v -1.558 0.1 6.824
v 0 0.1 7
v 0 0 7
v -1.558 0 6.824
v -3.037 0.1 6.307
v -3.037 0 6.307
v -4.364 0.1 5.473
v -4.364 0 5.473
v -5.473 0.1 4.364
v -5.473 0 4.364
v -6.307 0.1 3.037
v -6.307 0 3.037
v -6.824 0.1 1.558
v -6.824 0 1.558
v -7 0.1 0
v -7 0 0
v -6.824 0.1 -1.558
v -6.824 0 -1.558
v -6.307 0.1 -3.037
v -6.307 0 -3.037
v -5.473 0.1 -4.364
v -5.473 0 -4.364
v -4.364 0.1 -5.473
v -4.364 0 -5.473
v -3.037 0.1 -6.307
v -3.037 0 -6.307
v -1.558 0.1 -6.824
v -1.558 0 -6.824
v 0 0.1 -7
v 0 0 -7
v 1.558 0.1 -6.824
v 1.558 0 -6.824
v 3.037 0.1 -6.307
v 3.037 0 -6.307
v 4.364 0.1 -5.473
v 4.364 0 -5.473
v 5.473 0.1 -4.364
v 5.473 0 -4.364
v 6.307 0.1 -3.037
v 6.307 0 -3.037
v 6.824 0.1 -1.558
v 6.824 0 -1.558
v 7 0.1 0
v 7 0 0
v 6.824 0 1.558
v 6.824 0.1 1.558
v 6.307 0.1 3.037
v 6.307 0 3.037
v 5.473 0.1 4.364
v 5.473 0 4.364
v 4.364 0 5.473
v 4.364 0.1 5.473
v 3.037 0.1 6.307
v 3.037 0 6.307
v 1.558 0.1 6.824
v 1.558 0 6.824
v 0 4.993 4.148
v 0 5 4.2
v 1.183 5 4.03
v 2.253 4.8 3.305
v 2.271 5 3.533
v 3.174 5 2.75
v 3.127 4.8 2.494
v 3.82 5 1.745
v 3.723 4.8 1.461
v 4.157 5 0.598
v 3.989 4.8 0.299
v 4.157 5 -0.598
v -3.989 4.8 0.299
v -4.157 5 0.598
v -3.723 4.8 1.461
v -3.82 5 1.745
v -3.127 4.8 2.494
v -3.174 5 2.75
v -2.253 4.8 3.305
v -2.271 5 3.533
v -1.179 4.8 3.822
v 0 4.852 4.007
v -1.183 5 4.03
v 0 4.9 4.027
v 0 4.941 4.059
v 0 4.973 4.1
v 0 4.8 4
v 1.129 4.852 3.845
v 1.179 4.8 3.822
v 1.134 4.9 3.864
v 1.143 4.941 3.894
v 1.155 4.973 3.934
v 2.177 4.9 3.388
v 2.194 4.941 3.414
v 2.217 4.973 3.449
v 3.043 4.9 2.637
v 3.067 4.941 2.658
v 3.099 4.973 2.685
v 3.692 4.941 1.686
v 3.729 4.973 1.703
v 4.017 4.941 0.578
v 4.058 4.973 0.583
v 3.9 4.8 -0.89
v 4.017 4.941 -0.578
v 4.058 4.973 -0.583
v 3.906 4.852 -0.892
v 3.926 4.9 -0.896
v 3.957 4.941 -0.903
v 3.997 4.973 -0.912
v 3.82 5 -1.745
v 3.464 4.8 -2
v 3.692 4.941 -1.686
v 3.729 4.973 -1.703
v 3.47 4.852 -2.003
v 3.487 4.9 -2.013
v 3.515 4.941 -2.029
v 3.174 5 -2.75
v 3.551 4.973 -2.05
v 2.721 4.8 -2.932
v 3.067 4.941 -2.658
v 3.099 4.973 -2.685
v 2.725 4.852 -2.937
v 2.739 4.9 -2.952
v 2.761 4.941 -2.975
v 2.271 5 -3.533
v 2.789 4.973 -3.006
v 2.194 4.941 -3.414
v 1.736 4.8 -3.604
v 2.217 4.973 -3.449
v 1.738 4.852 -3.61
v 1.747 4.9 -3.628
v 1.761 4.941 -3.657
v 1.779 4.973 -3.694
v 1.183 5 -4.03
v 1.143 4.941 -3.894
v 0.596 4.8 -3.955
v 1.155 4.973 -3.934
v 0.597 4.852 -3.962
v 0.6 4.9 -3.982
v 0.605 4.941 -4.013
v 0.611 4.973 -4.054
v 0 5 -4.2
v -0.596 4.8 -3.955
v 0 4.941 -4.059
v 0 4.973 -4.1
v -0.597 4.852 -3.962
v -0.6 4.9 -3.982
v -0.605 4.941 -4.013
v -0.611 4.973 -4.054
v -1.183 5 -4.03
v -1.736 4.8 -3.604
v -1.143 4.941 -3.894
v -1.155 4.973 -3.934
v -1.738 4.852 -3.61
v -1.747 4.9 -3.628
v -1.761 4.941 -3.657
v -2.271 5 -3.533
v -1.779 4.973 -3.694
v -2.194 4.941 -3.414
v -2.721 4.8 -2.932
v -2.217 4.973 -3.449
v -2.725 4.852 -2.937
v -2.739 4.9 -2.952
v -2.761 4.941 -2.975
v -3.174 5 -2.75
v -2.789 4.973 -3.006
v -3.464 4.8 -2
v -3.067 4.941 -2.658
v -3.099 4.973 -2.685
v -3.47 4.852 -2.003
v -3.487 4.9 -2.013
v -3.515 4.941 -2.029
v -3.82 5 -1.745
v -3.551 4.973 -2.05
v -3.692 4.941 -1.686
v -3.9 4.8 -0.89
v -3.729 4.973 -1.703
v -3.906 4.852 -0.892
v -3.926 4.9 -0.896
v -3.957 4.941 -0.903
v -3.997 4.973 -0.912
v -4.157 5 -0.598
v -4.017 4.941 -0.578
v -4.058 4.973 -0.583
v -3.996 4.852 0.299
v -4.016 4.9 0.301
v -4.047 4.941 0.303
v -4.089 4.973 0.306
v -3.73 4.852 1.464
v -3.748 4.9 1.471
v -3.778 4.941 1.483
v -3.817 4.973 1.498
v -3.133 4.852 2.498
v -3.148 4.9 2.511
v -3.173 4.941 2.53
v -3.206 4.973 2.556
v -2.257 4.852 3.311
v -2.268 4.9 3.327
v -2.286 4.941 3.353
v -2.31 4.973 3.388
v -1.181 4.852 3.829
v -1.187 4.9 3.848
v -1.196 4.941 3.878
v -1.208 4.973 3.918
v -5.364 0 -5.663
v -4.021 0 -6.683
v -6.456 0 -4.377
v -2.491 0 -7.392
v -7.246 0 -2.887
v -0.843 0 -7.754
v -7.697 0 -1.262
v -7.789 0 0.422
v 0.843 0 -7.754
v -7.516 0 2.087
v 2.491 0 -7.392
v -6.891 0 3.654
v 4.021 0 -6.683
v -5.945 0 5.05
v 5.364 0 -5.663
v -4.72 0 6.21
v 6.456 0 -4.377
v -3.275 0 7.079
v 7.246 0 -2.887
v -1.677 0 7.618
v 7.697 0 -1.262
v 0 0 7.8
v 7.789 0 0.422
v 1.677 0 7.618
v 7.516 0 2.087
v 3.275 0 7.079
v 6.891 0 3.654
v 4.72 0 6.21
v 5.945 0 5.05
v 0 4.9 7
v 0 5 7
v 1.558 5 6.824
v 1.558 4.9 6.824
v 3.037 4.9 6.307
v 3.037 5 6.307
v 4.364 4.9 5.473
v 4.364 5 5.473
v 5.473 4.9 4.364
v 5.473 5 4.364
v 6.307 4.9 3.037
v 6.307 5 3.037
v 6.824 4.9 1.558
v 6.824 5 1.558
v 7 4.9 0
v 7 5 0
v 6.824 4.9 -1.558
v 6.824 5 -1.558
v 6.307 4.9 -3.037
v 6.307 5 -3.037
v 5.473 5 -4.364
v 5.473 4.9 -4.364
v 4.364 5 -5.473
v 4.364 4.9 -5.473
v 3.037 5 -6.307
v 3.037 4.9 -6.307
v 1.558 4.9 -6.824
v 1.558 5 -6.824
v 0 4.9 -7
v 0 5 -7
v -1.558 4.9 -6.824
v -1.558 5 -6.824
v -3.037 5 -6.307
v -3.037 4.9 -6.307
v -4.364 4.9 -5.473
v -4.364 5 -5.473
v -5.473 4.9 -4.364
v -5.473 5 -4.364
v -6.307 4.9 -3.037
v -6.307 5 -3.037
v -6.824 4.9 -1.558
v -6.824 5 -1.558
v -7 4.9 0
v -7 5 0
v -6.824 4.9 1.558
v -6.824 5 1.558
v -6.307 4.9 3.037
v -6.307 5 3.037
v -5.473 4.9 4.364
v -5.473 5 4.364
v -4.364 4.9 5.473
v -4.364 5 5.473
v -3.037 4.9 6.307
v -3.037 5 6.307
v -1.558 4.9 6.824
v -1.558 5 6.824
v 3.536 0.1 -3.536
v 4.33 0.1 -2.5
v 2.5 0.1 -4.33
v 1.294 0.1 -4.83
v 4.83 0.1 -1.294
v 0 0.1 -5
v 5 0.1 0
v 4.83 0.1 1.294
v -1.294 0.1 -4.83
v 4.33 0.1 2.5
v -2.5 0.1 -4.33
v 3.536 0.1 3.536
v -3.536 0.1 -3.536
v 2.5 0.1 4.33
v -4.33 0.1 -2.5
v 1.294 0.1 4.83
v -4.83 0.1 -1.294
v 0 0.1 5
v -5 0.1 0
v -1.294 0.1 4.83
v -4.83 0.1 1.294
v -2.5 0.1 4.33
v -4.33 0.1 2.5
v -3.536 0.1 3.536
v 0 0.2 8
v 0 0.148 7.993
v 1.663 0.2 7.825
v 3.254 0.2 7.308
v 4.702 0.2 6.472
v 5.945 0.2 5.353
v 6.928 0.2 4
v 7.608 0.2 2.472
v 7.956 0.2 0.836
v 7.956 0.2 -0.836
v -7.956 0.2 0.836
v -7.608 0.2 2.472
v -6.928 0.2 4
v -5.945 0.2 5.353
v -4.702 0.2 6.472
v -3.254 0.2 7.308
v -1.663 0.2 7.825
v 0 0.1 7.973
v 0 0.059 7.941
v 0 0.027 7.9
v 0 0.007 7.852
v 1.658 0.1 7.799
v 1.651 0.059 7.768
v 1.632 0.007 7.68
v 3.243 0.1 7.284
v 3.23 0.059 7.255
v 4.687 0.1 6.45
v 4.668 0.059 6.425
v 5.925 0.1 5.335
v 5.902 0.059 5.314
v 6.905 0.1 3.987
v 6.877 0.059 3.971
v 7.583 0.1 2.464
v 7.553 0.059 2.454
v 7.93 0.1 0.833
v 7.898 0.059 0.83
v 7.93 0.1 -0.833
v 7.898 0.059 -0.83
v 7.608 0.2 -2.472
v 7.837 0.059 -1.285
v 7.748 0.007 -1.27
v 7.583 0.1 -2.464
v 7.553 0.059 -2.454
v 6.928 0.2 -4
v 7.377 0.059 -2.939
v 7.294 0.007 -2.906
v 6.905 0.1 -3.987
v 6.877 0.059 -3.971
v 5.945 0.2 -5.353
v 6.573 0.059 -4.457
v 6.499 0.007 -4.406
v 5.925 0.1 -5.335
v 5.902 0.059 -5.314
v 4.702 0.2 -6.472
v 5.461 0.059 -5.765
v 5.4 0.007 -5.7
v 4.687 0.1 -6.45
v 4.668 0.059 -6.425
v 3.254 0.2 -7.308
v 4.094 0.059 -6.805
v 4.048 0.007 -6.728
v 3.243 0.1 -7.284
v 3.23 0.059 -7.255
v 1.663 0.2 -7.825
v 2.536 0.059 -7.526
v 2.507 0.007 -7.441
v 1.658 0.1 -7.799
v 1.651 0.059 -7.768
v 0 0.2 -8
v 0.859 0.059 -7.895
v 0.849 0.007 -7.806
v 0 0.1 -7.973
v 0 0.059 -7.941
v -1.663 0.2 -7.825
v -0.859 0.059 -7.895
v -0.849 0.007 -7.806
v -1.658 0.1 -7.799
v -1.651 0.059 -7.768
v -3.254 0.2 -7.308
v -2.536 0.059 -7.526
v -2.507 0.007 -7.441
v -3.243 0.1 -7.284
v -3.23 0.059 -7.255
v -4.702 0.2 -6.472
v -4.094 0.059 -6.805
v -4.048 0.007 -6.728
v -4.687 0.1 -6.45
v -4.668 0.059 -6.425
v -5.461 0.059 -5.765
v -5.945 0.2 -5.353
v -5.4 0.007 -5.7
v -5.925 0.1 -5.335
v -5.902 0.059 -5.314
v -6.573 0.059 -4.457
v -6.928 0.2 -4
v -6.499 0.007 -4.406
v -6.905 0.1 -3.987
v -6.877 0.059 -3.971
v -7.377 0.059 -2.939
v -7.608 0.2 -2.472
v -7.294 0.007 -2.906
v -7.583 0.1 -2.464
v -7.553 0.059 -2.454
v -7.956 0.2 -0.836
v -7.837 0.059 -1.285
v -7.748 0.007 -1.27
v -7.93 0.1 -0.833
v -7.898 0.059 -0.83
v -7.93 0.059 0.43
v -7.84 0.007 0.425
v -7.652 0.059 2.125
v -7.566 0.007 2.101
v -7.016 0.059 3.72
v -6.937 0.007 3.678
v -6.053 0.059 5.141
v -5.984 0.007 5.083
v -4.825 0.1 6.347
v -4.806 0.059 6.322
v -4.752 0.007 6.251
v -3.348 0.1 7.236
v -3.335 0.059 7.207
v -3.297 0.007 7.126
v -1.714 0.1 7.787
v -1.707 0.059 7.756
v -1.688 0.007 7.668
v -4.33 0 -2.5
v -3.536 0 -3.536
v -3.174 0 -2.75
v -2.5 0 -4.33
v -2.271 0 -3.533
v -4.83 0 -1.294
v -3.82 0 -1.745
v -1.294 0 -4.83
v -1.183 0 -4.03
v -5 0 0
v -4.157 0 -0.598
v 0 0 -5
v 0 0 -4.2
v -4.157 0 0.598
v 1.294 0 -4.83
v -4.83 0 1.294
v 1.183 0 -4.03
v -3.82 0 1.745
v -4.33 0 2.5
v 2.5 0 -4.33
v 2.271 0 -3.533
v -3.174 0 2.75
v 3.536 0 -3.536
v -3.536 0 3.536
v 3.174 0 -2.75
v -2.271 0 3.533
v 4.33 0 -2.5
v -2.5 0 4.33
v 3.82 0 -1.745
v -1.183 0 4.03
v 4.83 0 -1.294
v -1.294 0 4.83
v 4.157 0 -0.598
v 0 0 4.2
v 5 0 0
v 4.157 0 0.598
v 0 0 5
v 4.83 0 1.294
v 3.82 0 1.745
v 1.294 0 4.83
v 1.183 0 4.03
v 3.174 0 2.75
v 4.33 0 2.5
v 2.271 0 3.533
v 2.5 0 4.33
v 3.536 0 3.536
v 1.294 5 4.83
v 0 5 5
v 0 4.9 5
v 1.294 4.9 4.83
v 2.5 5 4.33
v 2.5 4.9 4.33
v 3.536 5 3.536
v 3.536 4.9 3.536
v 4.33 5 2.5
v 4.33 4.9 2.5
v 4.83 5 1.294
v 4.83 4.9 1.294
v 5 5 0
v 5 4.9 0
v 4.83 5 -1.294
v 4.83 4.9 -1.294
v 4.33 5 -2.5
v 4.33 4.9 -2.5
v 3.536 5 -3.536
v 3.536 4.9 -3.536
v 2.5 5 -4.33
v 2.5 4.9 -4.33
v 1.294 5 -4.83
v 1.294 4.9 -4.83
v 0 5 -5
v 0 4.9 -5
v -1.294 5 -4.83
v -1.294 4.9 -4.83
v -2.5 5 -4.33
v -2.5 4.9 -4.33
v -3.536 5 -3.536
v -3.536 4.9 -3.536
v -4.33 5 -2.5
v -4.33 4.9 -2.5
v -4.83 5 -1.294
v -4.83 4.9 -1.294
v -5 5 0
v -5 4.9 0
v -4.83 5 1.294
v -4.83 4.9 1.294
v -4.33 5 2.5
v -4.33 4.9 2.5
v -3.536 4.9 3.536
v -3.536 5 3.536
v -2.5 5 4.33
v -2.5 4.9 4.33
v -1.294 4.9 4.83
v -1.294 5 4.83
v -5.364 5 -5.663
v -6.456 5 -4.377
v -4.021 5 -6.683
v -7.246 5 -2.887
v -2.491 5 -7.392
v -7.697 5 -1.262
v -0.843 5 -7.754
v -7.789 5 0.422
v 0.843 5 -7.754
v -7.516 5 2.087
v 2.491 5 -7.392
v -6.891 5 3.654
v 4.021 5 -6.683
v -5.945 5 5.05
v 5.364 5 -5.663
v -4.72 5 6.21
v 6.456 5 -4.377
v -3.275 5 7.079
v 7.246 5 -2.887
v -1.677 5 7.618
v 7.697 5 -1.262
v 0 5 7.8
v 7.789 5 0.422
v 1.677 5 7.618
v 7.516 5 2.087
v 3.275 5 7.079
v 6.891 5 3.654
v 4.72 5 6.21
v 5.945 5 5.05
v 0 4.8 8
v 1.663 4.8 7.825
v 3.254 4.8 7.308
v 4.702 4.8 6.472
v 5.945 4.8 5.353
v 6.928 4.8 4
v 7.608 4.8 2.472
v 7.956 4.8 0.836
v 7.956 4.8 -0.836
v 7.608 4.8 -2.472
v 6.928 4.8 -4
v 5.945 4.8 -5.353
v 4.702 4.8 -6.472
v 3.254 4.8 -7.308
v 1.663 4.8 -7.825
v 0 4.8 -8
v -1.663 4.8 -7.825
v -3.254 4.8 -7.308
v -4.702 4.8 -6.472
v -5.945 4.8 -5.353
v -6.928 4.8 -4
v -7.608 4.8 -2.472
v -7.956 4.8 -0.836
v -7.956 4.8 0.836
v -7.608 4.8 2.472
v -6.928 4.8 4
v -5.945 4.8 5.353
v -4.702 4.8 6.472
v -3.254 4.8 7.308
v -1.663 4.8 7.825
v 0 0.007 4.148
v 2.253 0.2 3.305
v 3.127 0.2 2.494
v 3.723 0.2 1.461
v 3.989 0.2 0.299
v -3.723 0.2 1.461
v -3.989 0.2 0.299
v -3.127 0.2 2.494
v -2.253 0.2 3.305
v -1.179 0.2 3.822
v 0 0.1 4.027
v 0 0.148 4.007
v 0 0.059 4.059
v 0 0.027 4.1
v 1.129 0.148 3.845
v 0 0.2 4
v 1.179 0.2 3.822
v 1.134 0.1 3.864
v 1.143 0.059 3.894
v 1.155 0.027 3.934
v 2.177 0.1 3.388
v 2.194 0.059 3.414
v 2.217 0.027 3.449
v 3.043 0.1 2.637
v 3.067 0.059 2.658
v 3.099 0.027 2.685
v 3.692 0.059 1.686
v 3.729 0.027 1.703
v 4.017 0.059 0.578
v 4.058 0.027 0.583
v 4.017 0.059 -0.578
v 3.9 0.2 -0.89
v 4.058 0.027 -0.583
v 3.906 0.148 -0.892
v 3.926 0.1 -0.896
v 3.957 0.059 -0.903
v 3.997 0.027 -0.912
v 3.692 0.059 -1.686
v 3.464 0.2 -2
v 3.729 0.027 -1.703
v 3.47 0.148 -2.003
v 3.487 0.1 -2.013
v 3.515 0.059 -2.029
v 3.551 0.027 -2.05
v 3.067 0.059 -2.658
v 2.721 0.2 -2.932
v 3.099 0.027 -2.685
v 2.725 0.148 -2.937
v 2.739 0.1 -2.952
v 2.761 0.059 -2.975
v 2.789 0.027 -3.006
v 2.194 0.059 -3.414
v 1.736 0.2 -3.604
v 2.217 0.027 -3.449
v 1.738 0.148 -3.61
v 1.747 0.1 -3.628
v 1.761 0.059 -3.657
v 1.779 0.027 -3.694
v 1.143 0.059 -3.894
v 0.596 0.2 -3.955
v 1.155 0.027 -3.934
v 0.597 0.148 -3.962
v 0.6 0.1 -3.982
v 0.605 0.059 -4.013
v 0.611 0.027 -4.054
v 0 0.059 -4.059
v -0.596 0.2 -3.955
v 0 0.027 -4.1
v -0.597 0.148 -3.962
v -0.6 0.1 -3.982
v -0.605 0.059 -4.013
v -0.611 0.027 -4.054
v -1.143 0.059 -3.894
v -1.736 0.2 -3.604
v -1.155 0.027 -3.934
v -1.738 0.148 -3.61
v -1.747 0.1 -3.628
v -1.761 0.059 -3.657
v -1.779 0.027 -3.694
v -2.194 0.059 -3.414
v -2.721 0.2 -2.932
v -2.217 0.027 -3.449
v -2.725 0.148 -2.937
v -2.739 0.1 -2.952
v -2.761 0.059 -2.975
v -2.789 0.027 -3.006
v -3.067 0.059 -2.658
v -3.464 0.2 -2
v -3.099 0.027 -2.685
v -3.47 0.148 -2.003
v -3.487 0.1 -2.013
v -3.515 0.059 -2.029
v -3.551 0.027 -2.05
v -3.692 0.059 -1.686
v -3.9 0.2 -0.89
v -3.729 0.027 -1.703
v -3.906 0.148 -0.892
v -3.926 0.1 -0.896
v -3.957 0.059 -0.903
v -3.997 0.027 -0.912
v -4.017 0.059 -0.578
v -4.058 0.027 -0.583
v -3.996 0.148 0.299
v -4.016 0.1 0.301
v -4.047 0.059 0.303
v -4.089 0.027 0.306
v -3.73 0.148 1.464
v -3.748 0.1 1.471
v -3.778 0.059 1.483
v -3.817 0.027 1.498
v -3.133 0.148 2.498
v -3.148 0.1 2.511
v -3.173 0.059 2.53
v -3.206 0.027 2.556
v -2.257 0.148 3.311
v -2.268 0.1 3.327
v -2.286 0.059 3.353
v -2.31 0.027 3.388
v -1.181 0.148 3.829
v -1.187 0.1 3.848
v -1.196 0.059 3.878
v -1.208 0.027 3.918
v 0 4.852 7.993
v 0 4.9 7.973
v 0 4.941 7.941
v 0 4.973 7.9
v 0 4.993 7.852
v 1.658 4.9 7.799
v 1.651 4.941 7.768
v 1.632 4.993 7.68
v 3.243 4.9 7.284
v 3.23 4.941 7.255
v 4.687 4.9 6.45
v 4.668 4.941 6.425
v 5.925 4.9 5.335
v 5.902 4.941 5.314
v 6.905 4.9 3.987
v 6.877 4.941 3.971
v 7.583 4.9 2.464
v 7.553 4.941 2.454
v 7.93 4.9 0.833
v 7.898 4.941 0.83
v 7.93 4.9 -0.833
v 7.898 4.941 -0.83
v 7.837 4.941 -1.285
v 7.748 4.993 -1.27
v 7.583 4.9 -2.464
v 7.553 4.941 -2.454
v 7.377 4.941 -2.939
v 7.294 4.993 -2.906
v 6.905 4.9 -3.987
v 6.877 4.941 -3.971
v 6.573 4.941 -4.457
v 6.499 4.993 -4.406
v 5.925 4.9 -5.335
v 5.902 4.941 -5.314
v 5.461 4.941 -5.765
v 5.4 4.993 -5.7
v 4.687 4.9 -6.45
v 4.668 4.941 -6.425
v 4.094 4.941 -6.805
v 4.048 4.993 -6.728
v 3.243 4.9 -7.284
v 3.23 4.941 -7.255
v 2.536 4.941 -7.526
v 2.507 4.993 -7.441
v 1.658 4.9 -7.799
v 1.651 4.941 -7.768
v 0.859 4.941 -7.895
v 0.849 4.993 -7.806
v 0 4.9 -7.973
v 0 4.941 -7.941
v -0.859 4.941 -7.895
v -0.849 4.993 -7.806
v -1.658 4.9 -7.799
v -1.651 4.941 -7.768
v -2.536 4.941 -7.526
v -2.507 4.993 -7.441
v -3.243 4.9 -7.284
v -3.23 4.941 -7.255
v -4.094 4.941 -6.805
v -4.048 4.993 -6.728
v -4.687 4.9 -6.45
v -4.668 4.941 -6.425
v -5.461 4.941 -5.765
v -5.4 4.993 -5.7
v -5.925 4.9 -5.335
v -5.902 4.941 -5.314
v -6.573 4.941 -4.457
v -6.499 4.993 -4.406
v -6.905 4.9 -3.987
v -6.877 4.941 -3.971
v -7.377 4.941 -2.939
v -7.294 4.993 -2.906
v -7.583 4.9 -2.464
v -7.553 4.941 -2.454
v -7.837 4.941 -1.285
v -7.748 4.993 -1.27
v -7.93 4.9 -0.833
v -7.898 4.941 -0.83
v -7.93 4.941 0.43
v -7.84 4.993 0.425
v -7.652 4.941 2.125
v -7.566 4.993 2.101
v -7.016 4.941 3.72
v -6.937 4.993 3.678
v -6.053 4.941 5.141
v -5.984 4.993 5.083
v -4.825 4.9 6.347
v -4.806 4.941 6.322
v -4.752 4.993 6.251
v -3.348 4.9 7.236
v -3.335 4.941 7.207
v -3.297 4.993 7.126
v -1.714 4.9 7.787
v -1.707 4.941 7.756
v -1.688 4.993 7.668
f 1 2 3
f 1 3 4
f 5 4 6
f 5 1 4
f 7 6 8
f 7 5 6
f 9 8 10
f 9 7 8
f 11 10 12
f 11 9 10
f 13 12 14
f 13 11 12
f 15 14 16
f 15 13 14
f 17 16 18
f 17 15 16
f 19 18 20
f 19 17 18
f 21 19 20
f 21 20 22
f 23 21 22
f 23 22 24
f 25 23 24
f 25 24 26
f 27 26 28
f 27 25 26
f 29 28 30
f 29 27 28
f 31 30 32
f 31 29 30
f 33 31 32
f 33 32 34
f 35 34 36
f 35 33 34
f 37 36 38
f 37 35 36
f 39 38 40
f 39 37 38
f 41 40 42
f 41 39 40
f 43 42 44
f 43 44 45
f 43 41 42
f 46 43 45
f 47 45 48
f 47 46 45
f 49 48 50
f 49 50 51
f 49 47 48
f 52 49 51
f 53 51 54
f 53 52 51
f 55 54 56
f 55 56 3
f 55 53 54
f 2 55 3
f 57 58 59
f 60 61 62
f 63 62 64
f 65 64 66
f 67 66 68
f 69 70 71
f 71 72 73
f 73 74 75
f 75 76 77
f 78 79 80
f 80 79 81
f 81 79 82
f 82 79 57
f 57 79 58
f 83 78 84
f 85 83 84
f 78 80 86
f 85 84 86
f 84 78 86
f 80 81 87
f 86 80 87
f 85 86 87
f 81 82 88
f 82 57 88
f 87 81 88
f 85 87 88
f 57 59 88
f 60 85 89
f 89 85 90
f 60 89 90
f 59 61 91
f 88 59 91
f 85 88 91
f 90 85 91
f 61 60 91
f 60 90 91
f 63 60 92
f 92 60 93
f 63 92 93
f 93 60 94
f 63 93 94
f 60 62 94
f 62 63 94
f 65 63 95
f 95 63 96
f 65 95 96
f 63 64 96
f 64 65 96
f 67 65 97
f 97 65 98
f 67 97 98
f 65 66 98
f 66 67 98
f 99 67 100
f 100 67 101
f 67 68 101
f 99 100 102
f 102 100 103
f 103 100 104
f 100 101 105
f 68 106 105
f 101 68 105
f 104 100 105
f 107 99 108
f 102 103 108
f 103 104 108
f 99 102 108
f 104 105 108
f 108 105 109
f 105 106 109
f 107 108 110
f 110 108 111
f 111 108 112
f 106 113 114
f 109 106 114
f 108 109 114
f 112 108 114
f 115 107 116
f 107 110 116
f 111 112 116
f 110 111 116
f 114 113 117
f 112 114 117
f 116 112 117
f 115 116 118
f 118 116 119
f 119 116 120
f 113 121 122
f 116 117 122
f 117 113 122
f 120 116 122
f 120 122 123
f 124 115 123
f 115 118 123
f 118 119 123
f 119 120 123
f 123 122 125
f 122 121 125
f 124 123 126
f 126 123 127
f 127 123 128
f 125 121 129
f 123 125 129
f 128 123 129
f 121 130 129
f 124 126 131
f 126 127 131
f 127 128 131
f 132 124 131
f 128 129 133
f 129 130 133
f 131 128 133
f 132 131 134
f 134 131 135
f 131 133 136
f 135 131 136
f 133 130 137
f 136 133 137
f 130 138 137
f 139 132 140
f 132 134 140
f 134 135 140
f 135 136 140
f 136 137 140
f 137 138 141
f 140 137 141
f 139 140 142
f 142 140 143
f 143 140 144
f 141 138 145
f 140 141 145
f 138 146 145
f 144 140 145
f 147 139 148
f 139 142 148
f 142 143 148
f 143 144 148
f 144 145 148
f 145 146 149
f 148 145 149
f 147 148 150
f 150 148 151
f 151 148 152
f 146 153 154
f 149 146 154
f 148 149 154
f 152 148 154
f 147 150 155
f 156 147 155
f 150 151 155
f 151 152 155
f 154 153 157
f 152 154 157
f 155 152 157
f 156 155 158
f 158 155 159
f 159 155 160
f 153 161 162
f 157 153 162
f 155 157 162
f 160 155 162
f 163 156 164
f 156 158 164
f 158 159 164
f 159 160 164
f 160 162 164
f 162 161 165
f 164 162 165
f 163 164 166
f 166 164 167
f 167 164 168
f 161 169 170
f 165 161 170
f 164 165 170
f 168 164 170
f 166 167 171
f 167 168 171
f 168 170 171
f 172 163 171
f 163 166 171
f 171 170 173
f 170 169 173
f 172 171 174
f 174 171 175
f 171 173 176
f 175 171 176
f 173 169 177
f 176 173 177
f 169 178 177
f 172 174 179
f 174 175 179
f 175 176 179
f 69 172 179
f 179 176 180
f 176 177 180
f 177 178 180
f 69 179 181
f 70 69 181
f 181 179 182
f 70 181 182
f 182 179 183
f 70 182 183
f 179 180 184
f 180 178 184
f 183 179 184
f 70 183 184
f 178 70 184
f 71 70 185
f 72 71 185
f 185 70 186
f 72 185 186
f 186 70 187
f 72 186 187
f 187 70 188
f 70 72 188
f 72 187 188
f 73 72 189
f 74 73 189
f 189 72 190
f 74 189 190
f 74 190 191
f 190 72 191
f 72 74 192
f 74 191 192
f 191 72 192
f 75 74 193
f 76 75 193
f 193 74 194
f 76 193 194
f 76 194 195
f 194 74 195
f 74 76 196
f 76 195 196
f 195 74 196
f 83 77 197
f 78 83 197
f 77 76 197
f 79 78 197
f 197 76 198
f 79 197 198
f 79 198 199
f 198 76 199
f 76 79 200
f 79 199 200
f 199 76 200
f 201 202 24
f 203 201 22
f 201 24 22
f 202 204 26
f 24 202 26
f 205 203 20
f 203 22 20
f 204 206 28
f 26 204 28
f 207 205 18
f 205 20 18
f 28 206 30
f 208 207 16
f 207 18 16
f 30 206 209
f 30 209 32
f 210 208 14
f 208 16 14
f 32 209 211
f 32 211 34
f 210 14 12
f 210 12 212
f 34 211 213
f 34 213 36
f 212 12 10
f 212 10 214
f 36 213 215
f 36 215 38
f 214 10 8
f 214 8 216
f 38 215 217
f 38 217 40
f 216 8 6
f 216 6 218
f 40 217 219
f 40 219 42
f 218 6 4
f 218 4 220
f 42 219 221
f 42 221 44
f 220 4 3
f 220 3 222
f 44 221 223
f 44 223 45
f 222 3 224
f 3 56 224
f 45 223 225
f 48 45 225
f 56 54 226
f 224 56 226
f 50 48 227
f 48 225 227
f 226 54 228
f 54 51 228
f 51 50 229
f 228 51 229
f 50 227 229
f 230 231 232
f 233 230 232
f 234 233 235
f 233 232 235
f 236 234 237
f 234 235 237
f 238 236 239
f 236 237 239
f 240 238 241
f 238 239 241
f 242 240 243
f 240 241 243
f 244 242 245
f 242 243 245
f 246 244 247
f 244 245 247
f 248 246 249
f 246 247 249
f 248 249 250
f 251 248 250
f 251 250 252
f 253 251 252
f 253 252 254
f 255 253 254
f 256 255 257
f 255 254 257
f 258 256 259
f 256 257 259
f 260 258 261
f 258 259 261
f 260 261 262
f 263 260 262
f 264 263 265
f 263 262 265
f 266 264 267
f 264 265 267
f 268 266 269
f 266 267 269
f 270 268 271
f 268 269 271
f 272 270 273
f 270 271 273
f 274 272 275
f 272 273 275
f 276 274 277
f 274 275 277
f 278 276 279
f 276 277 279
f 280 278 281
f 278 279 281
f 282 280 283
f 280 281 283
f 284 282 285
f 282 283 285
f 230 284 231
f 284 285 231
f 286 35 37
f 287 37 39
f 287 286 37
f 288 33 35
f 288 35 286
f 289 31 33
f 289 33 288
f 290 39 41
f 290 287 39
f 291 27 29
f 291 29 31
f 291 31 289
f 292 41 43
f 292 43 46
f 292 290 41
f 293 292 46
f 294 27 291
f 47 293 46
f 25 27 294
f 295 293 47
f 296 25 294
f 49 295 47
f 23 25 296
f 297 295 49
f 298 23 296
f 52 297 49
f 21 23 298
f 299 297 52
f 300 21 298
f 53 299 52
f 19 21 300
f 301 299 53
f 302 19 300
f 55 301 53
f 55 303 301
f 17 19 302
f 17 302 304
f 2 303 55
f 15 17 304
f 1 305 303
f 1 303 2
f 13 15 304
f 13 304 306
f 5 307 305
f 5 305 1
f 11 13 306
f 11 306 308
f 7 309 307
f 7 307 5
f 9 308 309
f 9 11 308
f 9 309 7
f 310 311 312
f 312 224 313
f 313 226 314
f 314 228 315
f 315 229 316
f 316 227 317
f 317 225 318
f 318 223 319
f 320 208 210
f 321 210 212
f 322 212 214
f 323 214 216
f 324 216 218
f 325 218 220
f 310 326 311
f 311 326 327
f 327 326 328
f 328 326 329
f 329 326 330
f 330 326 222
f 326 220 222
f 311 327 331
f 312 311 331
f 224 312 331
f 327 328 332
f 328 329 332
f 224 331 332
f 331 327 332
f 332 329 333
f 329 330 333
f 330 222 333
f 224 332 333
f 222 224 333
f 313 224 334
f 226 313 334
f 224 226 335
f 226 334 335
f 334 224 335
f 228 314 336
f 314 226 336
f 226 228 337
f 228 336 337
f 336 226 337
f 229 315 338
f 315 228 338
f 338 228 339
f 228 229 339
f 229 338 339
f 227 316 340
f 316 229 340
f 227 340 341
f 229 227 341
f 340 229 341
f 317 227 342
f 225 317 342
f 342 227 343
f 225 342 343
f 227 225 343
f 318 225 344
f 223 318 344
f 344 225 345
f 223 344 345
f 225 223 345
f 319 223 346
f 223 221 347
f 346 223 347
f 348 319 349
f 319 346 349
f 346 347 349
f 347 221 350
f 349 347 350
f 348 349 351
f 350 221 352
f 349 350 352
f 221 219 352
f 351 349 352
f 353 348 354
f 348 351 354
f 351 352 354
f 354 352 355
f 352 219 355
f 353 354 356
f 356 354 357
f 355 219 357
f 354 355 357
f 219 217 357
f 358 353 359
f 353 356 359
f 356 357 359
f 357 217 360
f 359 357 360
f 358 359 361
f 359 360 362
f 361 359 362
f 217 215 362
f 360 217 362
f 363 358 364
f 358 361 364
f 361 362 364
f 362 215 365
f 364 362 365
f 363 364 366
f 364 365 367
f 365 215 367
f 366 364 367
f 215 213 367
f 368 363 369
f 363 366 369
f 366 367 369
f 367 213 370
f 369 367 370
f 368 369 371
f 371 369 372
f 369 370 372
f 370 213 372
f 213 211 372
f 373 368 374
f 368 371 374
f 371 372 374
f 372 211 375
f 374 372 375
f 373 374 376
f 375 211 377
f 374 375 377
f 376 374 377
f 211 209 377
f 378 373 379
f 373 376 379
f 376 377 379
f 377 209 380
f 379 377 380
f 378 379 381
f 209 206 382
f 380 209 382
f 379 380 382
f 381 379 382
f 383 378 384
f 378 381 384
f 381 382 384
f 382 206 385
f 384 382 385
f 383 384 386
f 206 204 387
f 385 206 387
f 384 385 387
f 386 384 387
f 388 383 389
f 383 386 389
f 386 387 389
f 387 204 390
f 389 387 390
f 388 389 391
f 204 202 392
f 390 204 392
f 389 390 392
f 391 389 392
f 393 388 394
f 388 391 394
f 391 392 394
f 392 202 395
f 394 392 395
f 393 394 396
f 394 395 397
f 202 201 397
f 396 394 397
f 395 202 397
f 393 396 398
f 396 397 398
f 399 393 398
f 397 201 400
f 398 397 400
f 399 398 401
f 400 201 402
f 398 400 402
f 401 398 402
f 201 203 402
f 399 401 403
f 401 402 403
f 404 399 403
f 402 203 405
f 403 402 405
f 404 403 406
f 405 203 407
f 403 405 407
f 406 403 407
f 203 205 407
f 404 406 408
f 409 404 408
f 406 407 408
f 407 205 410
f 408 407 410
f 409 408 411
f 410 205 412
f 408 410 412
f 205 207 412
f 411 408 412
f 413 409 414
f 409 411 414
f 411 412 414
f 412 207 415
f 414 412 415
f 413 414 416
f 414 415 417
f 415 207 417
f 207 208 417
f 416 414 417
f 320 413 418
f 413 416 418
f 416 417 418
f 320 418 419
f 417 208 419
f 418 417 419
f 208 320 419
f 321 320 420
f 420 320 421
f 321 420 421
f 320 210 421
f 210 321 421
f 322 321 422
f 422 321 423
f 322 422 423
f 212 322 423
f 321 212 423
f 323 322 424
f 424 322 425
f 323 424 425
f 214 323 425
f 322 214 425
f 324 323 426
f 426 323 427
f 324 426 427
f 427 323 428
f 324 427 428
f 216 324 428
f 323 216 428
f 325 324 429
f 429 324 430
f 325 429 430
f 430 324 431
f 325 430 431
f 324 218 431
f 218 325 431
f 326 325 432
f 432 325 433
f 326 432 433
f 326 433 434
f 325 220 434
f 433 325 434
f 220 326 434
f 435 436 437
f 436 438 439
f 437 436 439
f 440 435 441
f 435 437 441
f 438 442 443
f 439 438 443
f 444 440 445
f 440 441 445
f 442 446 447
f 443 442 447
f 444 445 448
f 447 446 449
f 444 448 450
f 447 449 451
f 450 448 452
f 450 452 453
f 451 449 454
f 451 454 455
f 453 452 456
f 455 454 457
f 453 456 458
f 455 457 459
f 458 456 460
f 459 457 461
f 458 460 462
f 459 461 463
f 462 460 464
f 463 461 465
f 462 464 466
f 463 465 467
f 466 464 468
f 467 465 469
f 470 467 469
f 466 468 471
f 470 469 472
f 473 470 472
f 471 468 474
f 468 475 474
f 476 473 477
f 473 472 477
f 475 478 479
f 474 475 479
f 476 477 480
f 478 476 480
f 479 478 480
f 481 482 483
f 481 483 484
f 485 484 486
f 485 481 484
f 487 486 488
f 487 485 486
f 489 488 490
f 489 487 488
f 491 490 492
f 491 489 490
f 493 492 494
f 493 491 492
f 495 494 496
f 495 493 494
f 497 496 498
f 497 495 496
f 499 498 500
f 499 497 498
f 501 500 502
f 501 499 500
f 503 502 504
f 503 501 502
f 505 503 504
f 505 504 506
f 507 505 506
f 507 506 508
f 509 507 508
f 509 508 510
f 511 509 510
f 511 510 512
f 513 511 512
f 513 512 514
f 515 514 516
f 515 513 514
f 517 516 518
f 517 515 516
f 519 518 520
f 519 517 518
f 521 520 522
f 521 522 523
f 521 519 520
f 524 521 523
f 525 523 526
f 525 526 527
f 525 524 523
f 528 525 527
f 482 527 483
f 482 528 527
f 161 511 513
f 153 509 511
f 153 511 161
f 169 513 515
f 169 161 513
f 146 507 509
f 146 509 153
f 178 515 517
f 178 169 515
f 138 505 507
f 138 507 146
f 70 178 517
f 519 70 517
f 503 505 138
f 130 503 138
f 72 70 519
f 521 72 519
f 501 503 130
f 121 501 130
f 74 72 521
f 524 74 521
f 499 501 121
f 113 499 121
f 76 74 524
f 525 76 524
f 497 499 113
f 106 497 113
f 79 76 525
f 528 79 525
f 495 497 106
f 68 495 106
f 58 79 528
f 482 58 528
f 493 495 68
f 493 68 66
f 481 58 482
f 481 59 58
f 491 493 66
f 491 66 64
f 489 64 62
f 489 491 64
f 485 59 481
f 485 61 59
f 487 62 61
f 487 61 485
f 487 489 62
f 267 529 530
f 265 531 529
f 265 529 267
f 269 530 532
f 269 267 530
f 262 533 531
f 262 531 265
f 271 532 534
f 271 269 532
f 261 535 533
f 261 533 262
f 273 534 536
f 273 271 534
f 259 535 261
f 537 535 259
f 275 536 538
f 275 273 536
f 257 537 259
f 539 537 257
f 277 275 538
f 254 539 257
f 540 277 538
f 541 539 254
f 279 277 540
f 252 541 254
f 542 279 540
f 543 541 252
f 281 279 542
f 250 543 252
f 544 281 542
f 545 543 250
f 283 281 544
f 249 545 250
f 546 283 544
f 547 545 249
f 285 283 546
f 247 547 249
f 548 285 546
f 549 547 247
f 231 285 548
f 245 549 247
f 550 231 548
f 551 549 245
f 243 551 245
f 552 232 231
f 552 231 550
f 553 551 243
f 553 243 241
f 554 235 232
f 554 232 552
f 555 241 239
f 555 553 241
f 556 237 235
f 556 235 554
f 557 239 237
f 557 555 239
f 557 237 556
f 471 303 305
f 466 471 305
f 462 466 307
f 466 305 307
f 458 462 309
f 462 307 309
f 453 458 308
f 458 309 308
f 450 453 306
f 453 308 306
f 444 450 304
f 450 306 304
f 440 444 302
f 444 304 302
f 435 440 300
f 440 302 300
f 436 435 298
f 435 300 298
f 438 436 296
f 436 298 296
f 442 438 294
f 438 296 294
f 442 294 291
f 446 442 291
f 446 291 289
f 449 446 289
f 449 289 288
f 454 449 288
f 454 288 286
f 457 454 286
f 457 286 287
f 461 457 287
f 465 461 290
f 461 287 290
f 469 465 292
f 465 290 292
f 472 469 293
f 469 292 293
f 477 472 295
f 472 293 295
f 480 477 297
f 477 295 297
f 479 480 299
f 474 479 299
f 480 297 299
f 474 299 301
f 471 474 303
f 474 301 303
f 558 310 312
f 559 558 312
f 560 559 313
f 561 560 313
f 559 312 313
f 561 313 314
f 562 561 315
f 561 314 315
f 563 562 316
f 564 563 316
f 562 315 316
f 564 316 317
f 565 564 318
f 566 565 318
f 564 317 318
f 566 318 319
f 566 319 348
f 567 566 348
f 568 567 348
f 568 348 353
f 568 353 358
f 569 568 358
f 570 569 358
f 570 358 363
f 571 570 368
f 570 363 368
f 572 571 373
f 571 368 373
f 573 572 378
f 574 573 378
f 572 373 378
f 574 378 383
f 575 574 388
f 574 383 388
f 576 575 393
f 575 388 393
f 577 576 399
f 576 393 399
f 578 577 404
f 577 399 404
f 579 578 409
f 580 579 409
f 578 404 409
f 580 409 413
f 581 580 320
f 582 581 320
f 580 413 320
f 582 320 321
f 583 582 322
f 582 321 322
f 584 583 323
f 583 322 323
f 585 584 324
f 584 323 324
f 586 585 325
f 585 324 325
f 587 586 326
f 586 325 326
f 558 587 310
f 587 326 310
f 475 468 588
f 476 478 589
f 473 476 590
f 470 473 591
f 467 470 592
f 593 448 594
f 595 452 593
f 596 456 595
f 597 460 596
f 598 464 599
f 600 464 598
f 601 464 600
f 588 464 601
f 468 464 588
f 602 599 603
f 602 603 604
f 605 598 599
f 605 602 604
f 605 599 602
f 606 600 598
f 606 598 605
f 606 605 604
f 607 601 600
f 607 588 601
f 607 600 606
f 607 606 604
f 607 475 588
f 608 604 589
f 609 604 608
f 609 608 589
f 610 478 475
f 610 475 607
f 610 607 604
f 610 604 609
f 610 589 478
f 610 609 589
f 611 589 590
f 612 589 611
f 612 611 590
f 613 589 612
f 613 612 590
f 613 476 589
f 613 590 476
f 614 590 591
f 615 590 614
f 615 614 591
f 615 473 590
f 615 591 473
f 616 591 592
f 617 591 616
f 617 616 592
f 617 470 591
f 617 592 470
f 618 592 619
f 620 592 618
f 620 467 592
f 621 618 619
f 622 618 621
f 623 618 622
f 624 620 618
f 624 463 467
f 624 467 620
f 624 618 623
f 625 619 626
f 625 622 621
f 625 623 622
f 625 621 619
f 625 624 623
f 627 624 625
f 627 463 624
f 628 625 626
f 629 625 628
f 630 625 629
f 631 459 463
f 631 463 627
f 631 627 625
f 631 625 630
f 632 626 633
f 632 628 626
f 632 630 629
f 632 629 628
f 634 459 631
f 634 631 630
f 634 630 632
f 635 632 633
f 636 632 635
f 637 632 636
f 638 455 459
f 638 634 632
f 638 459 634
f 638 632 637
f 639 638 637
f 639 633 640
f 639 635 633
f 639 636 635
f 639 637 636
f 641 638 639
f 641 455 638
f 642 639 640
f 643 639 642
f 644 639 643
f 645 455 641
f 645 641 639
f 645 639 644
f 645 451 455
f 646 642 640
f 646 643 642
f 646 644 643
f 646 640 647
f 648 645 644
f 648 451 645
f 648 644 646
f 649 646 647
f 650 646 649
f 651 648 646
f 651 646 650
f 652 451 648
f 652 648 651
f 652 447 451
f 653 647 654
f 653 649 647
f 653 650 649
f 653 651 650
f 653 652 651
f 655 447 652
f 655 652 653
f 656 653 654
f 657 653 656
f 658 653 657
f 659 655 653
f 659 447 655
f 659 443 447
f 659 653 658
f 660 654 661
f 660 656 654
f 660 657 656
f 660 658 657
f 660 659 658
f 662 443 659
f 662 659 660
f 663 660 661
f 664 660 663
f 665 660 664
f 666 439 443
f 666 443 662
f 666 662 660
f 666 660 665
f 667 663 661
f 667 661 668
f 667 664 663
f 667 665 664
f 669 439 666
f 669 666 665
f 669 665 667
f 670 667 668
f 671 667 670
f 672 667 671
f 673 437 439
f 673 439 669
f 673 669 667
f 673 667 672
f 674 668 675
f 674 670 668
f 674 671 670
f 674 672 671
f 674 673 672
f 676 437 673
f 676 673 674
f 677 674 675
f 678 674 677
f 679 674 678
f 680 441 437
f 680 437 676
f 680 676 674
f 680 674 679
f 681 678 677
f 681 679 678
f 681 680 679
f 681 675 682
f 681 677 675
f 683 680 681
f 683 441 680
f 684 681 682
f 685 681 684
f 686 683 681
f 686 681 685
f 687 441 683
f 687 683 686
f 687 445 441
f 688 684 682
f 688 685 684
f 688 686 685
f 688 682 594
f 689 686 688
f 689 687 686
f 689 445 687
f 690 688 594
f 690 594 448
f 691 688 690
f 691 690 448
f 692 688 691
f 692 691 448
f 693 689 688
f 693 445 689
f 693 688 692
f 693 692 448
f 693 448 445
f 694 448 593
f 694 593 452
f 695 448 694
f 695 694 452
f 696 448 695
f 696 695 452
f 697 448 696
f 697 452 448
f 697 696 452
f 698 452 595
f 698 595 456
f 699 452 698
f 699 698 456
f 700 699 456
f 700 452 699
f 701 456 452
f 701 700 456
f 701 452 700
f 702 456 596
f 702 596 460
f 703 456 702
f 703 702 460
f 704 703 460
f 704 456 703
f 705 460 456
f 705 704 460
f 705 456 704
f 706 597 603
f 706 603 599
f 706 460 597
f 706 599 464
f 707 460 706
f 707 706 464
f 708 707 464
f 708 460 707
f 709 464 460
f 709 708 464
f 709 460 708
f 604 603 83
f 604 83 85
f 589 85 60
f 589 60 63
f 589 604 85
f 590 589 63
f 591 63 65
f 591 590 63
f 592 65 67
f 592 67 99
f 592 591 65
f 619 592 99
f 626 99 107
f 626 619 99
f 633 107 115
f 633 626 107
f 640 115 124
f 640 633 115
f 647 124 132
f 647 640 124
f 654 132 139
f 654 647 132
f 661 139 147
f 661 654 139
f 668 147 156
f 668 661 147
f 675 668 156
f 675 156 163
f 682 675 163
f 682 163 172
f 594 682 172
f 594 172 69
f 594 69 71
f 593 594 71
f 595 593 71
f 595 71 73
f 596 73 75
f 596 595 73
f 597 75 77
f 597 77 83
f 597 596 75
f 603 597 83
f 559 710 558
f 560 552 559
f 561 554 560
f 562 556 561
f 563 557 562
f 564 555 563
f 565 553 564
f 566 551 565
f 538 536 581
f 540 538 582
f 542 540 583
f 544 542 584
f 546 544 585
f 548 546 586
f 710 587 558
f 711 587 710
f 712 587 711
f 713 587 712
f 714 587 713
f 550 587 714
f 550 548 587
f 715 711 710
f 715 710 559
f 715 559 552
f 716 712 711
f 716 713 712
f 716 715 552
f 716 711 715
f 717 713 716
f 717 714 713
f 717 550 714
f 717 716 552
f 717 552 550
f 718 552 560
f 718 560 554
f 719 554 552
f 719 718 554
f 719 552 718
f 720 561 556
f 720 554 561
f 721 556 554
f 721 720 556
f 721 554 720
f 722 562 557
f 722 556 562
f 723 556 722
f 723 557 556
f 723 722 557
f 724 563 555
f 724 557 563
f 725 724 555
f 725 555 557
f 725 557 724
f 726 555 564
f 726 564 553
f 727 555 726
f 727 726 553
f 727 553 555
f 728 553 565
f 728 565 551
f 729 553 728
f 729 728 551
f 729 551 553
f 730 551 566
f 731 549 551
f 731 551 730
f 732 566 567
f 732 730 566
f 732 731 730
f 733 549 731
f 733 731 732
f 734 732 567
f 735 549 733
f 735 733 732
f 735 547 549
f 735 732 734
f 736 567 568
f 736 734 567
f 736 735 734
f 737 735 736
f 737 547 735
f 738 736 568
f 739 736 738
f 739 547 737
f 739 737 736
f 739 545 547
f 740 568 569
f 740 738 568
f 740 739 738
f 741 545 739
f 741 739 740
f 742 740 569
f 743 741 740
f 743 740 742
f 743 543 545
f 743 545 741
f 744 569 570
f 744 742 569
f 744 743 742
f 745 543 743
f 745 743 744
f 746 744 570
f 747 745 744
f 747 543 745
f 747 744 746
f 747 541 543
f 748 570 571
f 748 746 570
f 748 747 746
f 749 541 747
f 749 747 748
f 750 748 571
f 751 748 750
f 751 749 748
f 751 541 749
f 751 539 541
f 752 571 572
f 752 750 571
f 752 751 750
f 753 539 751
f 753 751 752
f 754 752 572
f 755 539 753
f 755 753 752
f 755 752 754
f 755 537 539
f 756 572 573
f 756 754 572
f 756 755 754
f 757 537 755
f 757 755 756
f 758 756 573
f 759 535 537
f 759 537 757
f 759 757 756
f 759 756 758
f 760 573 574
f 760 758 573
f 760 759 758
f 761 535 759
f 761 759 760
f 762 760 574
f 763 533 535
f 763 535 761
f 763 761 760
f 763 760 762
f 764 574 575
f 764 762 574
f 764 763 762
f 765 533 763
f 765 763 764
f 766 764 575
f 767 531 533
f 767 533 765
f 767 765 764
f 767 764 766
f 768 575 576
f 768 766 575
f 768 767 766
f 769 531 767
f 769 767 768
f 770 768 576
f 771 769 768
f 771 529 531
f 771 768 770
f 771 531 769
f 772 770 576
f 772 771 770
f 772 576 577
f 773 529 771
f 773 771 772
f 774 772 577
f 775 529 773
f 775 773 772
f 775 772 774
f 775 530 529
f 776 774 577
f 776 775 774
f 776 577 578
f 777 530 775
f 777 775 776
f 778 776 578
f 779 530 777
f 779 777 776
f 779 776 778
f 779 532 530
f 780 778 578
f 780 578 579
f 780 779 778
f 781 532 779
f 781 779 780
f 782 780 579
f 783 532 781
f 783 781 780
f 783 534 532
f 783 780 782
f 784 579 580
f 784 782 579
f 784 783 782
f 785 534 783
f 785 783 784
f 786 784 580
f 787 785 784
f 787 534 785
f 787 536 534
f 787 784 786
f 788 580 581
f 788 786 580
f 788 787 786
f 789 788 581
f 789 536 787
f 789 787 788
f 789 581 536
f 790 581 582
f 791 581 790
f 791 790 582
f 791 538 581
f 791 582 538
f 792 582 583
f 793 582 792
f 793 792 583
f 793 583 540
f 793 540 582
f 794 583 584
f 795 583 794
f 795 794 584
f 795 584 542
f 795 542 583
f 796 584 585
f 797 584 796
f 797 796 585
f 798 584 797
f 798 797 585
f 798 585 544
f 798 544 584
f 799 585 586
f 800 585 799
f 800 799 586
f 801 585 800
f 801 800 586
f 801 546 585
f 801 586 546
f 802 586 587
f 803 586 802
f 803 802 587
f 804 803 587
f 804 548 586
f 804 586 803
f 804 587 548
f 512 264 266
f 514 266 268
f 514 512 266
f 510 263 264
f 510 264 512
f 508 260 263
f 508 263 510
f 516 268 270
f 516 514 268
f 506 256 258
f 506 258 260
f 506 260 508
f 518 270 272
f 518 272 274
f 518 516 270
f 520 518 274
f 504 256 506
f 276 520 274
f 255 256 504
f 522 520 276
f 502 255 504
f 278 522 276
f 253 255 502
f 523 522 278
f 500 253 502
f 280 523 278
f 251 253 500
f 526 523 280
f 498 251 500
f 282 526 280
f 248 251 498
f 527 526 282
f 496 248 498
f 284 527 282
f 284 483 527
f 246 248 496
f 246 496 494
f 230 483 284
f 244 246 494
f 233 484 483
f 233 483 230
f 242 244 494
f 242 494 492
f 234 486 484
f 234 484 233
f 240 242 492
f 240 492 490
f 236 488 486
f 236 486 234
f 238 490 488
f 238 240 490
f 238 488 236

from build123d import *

# Parameters (mm, degrees)
SKETCH1_R           = 8
SKETCH1_R_2         = 4
BOSS_EXTRUDE1_DEPTH = 5
FILLET1_R           = 0.2
SKETCH2_R           = 7
SKETCH2_R_2         = 5
CUT_EXTRUDE1_DEPTH  = 0.1
CUT_EXTRUDE2_START  = -0.1
SKETCH3_R           = 7
SKETCH3_R_2         = 5
CUT_EXTRUDE2_DEPTH  = 0.1


with BuildPart() as part:
    # Sketch1 → Boss-Extrude1 (new body)
    with BuildSketch(Plane(origin=(0, 0, 0), x_dir=(1, 0, 0), z_dir=(0, 1, 0))):
        with Locations(Location((0, 0, 0), (0, 0, 270))):
            Circle(SKETCH1_R)
        with Locations(Location((0, 0, 0), (0, 0, 270))):
            Circle(SKETCH1_R_2, mode=Mode.SUBTRACT)
    extrude(amount=BOSS_EXTRUDE1_DEPTH)

    # Fillet1
    fillet1_edges = [part.edges().sort_by_distance(p)[0] for p in [
        (0, 0, -8),
        (0, 5, -8),
        (0, 0, -4),
        (0, 5, -4),
    ]]
    fillet(fillet1_edges, radius=FILLET1_R)

    # Sketch2 → Cut-Extrude1 (cut)
    with BuildSketch(Plane(origin=(0, 5, 0), x_dir=(1, 0, 0), z_dir=(0, 1, 0))):
        with Locations(Location((0, 0, 0), (0, 0, 270))):
            Circle(SKETCH2_R)
        with Locations(Location((0, 0, 0), (0, 0, 270))):
            Circle(SKETCH2_R_2, mode=Mode.SUBTRACT)
    extrude(amount=-CUT_EXTRUDE1_DEPTH, mode=Mode.SUBTRACT)

    # Sketch3 → Cut-Extrude2 (cut)
    with BuildSketch(Plane.XZ.offset(CUT_EXTRUDE2_START)):
        with Locations(Location((0, 0, 0), (0, 0, 90))):
            Circle(SKETCH3_R)
        with Locations(Location((0, 0, 0), (0, 0, 90))):
            Circle(SKETCH3_R_2, mode=Mode.SUBTRACT)
    extrude(amount=CUT_EXTRUDE2_DEPTH, mode=Mode.SUBTRACT)


solid = part.part
